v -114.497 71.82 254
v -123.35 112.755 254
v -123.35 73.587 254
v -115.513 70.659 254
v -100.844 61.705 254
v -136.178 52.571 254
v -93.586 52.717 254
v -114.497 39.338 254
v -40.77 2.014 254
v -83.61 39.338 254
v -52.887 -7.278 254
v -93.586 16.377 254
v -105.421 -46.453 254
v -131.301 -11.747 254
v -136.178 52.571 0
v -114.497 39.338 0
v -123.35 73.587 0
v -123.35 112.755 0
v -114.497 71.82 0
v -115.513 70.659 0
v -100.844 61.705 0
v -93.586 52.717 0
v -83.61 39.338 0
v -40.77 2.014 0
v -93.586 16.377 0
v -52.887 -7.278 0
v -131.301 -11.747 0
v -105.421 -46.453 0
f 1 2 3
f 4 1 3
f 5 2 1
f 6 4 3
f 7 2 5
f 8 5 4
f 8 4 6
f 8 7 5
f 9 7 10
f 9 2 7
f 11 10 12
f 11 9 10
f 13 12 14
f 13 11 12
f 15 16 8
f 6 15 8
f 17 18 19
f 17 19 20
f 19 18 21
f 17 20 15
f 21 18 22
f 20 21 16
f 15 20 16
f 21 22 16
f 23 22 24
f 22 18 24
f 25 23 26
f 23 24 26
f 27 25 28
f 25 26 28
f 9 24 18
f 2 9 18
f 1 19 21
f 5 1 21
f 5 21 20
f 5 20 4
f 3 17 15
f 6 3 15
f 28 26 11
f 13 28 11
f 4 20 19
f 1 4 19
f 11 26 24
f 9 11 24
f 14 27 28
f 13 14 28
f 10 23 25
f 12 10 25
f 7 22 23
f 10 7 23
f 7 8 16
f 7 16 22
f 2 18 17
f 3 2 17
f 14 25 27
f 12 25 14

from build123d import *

# Parameters (mm, degrees)
F1_DEPTH = 254
F2_DEPTH = 65.532
F3_DEPTH = 25.4


with BuildPart() as f1:
    # F0 (on Top) → F1 (new body)
    with BuildSketch(Plane.XY):
        Polygon((-40.7700149094, 2.0136271135), (-123.3497112989, 112.7550974488), (-123.3497112989, 61.7054067552), (-114.4973933697, 71.8195125399), (-100.8444875479, 61.7054067552), (-114.4973933697, 39.3378809094), (-93.5864523053, 52.7165209869), (-83.6100267408, 39.3378809094), (-93.5864523053, 16.3773968816), (-78.7674486637, 27.4278987199), (-52.8872246498, -7.2781390256), align=None)
    extrude(amount=F1_DEPTH)

    # F2 (add): a face of the model
    f2_faces = [f1.faces().sort_by_distance(p)[0] for p in [
        (-65.8273366568, 10.0748798471, 127),
    ]]
    extrude(f2_faces, amount=F2_DEPTH)

    # F3 (add): a face of the model
    f3_faces = [f1.faces().sort_by_distance(p)[0] for p in [
        (-107.6709404588, 50.5216438323, 127),
    ]]
    extrude(f3_faces, amount=F3_DEPTH)


solid = f1.part
